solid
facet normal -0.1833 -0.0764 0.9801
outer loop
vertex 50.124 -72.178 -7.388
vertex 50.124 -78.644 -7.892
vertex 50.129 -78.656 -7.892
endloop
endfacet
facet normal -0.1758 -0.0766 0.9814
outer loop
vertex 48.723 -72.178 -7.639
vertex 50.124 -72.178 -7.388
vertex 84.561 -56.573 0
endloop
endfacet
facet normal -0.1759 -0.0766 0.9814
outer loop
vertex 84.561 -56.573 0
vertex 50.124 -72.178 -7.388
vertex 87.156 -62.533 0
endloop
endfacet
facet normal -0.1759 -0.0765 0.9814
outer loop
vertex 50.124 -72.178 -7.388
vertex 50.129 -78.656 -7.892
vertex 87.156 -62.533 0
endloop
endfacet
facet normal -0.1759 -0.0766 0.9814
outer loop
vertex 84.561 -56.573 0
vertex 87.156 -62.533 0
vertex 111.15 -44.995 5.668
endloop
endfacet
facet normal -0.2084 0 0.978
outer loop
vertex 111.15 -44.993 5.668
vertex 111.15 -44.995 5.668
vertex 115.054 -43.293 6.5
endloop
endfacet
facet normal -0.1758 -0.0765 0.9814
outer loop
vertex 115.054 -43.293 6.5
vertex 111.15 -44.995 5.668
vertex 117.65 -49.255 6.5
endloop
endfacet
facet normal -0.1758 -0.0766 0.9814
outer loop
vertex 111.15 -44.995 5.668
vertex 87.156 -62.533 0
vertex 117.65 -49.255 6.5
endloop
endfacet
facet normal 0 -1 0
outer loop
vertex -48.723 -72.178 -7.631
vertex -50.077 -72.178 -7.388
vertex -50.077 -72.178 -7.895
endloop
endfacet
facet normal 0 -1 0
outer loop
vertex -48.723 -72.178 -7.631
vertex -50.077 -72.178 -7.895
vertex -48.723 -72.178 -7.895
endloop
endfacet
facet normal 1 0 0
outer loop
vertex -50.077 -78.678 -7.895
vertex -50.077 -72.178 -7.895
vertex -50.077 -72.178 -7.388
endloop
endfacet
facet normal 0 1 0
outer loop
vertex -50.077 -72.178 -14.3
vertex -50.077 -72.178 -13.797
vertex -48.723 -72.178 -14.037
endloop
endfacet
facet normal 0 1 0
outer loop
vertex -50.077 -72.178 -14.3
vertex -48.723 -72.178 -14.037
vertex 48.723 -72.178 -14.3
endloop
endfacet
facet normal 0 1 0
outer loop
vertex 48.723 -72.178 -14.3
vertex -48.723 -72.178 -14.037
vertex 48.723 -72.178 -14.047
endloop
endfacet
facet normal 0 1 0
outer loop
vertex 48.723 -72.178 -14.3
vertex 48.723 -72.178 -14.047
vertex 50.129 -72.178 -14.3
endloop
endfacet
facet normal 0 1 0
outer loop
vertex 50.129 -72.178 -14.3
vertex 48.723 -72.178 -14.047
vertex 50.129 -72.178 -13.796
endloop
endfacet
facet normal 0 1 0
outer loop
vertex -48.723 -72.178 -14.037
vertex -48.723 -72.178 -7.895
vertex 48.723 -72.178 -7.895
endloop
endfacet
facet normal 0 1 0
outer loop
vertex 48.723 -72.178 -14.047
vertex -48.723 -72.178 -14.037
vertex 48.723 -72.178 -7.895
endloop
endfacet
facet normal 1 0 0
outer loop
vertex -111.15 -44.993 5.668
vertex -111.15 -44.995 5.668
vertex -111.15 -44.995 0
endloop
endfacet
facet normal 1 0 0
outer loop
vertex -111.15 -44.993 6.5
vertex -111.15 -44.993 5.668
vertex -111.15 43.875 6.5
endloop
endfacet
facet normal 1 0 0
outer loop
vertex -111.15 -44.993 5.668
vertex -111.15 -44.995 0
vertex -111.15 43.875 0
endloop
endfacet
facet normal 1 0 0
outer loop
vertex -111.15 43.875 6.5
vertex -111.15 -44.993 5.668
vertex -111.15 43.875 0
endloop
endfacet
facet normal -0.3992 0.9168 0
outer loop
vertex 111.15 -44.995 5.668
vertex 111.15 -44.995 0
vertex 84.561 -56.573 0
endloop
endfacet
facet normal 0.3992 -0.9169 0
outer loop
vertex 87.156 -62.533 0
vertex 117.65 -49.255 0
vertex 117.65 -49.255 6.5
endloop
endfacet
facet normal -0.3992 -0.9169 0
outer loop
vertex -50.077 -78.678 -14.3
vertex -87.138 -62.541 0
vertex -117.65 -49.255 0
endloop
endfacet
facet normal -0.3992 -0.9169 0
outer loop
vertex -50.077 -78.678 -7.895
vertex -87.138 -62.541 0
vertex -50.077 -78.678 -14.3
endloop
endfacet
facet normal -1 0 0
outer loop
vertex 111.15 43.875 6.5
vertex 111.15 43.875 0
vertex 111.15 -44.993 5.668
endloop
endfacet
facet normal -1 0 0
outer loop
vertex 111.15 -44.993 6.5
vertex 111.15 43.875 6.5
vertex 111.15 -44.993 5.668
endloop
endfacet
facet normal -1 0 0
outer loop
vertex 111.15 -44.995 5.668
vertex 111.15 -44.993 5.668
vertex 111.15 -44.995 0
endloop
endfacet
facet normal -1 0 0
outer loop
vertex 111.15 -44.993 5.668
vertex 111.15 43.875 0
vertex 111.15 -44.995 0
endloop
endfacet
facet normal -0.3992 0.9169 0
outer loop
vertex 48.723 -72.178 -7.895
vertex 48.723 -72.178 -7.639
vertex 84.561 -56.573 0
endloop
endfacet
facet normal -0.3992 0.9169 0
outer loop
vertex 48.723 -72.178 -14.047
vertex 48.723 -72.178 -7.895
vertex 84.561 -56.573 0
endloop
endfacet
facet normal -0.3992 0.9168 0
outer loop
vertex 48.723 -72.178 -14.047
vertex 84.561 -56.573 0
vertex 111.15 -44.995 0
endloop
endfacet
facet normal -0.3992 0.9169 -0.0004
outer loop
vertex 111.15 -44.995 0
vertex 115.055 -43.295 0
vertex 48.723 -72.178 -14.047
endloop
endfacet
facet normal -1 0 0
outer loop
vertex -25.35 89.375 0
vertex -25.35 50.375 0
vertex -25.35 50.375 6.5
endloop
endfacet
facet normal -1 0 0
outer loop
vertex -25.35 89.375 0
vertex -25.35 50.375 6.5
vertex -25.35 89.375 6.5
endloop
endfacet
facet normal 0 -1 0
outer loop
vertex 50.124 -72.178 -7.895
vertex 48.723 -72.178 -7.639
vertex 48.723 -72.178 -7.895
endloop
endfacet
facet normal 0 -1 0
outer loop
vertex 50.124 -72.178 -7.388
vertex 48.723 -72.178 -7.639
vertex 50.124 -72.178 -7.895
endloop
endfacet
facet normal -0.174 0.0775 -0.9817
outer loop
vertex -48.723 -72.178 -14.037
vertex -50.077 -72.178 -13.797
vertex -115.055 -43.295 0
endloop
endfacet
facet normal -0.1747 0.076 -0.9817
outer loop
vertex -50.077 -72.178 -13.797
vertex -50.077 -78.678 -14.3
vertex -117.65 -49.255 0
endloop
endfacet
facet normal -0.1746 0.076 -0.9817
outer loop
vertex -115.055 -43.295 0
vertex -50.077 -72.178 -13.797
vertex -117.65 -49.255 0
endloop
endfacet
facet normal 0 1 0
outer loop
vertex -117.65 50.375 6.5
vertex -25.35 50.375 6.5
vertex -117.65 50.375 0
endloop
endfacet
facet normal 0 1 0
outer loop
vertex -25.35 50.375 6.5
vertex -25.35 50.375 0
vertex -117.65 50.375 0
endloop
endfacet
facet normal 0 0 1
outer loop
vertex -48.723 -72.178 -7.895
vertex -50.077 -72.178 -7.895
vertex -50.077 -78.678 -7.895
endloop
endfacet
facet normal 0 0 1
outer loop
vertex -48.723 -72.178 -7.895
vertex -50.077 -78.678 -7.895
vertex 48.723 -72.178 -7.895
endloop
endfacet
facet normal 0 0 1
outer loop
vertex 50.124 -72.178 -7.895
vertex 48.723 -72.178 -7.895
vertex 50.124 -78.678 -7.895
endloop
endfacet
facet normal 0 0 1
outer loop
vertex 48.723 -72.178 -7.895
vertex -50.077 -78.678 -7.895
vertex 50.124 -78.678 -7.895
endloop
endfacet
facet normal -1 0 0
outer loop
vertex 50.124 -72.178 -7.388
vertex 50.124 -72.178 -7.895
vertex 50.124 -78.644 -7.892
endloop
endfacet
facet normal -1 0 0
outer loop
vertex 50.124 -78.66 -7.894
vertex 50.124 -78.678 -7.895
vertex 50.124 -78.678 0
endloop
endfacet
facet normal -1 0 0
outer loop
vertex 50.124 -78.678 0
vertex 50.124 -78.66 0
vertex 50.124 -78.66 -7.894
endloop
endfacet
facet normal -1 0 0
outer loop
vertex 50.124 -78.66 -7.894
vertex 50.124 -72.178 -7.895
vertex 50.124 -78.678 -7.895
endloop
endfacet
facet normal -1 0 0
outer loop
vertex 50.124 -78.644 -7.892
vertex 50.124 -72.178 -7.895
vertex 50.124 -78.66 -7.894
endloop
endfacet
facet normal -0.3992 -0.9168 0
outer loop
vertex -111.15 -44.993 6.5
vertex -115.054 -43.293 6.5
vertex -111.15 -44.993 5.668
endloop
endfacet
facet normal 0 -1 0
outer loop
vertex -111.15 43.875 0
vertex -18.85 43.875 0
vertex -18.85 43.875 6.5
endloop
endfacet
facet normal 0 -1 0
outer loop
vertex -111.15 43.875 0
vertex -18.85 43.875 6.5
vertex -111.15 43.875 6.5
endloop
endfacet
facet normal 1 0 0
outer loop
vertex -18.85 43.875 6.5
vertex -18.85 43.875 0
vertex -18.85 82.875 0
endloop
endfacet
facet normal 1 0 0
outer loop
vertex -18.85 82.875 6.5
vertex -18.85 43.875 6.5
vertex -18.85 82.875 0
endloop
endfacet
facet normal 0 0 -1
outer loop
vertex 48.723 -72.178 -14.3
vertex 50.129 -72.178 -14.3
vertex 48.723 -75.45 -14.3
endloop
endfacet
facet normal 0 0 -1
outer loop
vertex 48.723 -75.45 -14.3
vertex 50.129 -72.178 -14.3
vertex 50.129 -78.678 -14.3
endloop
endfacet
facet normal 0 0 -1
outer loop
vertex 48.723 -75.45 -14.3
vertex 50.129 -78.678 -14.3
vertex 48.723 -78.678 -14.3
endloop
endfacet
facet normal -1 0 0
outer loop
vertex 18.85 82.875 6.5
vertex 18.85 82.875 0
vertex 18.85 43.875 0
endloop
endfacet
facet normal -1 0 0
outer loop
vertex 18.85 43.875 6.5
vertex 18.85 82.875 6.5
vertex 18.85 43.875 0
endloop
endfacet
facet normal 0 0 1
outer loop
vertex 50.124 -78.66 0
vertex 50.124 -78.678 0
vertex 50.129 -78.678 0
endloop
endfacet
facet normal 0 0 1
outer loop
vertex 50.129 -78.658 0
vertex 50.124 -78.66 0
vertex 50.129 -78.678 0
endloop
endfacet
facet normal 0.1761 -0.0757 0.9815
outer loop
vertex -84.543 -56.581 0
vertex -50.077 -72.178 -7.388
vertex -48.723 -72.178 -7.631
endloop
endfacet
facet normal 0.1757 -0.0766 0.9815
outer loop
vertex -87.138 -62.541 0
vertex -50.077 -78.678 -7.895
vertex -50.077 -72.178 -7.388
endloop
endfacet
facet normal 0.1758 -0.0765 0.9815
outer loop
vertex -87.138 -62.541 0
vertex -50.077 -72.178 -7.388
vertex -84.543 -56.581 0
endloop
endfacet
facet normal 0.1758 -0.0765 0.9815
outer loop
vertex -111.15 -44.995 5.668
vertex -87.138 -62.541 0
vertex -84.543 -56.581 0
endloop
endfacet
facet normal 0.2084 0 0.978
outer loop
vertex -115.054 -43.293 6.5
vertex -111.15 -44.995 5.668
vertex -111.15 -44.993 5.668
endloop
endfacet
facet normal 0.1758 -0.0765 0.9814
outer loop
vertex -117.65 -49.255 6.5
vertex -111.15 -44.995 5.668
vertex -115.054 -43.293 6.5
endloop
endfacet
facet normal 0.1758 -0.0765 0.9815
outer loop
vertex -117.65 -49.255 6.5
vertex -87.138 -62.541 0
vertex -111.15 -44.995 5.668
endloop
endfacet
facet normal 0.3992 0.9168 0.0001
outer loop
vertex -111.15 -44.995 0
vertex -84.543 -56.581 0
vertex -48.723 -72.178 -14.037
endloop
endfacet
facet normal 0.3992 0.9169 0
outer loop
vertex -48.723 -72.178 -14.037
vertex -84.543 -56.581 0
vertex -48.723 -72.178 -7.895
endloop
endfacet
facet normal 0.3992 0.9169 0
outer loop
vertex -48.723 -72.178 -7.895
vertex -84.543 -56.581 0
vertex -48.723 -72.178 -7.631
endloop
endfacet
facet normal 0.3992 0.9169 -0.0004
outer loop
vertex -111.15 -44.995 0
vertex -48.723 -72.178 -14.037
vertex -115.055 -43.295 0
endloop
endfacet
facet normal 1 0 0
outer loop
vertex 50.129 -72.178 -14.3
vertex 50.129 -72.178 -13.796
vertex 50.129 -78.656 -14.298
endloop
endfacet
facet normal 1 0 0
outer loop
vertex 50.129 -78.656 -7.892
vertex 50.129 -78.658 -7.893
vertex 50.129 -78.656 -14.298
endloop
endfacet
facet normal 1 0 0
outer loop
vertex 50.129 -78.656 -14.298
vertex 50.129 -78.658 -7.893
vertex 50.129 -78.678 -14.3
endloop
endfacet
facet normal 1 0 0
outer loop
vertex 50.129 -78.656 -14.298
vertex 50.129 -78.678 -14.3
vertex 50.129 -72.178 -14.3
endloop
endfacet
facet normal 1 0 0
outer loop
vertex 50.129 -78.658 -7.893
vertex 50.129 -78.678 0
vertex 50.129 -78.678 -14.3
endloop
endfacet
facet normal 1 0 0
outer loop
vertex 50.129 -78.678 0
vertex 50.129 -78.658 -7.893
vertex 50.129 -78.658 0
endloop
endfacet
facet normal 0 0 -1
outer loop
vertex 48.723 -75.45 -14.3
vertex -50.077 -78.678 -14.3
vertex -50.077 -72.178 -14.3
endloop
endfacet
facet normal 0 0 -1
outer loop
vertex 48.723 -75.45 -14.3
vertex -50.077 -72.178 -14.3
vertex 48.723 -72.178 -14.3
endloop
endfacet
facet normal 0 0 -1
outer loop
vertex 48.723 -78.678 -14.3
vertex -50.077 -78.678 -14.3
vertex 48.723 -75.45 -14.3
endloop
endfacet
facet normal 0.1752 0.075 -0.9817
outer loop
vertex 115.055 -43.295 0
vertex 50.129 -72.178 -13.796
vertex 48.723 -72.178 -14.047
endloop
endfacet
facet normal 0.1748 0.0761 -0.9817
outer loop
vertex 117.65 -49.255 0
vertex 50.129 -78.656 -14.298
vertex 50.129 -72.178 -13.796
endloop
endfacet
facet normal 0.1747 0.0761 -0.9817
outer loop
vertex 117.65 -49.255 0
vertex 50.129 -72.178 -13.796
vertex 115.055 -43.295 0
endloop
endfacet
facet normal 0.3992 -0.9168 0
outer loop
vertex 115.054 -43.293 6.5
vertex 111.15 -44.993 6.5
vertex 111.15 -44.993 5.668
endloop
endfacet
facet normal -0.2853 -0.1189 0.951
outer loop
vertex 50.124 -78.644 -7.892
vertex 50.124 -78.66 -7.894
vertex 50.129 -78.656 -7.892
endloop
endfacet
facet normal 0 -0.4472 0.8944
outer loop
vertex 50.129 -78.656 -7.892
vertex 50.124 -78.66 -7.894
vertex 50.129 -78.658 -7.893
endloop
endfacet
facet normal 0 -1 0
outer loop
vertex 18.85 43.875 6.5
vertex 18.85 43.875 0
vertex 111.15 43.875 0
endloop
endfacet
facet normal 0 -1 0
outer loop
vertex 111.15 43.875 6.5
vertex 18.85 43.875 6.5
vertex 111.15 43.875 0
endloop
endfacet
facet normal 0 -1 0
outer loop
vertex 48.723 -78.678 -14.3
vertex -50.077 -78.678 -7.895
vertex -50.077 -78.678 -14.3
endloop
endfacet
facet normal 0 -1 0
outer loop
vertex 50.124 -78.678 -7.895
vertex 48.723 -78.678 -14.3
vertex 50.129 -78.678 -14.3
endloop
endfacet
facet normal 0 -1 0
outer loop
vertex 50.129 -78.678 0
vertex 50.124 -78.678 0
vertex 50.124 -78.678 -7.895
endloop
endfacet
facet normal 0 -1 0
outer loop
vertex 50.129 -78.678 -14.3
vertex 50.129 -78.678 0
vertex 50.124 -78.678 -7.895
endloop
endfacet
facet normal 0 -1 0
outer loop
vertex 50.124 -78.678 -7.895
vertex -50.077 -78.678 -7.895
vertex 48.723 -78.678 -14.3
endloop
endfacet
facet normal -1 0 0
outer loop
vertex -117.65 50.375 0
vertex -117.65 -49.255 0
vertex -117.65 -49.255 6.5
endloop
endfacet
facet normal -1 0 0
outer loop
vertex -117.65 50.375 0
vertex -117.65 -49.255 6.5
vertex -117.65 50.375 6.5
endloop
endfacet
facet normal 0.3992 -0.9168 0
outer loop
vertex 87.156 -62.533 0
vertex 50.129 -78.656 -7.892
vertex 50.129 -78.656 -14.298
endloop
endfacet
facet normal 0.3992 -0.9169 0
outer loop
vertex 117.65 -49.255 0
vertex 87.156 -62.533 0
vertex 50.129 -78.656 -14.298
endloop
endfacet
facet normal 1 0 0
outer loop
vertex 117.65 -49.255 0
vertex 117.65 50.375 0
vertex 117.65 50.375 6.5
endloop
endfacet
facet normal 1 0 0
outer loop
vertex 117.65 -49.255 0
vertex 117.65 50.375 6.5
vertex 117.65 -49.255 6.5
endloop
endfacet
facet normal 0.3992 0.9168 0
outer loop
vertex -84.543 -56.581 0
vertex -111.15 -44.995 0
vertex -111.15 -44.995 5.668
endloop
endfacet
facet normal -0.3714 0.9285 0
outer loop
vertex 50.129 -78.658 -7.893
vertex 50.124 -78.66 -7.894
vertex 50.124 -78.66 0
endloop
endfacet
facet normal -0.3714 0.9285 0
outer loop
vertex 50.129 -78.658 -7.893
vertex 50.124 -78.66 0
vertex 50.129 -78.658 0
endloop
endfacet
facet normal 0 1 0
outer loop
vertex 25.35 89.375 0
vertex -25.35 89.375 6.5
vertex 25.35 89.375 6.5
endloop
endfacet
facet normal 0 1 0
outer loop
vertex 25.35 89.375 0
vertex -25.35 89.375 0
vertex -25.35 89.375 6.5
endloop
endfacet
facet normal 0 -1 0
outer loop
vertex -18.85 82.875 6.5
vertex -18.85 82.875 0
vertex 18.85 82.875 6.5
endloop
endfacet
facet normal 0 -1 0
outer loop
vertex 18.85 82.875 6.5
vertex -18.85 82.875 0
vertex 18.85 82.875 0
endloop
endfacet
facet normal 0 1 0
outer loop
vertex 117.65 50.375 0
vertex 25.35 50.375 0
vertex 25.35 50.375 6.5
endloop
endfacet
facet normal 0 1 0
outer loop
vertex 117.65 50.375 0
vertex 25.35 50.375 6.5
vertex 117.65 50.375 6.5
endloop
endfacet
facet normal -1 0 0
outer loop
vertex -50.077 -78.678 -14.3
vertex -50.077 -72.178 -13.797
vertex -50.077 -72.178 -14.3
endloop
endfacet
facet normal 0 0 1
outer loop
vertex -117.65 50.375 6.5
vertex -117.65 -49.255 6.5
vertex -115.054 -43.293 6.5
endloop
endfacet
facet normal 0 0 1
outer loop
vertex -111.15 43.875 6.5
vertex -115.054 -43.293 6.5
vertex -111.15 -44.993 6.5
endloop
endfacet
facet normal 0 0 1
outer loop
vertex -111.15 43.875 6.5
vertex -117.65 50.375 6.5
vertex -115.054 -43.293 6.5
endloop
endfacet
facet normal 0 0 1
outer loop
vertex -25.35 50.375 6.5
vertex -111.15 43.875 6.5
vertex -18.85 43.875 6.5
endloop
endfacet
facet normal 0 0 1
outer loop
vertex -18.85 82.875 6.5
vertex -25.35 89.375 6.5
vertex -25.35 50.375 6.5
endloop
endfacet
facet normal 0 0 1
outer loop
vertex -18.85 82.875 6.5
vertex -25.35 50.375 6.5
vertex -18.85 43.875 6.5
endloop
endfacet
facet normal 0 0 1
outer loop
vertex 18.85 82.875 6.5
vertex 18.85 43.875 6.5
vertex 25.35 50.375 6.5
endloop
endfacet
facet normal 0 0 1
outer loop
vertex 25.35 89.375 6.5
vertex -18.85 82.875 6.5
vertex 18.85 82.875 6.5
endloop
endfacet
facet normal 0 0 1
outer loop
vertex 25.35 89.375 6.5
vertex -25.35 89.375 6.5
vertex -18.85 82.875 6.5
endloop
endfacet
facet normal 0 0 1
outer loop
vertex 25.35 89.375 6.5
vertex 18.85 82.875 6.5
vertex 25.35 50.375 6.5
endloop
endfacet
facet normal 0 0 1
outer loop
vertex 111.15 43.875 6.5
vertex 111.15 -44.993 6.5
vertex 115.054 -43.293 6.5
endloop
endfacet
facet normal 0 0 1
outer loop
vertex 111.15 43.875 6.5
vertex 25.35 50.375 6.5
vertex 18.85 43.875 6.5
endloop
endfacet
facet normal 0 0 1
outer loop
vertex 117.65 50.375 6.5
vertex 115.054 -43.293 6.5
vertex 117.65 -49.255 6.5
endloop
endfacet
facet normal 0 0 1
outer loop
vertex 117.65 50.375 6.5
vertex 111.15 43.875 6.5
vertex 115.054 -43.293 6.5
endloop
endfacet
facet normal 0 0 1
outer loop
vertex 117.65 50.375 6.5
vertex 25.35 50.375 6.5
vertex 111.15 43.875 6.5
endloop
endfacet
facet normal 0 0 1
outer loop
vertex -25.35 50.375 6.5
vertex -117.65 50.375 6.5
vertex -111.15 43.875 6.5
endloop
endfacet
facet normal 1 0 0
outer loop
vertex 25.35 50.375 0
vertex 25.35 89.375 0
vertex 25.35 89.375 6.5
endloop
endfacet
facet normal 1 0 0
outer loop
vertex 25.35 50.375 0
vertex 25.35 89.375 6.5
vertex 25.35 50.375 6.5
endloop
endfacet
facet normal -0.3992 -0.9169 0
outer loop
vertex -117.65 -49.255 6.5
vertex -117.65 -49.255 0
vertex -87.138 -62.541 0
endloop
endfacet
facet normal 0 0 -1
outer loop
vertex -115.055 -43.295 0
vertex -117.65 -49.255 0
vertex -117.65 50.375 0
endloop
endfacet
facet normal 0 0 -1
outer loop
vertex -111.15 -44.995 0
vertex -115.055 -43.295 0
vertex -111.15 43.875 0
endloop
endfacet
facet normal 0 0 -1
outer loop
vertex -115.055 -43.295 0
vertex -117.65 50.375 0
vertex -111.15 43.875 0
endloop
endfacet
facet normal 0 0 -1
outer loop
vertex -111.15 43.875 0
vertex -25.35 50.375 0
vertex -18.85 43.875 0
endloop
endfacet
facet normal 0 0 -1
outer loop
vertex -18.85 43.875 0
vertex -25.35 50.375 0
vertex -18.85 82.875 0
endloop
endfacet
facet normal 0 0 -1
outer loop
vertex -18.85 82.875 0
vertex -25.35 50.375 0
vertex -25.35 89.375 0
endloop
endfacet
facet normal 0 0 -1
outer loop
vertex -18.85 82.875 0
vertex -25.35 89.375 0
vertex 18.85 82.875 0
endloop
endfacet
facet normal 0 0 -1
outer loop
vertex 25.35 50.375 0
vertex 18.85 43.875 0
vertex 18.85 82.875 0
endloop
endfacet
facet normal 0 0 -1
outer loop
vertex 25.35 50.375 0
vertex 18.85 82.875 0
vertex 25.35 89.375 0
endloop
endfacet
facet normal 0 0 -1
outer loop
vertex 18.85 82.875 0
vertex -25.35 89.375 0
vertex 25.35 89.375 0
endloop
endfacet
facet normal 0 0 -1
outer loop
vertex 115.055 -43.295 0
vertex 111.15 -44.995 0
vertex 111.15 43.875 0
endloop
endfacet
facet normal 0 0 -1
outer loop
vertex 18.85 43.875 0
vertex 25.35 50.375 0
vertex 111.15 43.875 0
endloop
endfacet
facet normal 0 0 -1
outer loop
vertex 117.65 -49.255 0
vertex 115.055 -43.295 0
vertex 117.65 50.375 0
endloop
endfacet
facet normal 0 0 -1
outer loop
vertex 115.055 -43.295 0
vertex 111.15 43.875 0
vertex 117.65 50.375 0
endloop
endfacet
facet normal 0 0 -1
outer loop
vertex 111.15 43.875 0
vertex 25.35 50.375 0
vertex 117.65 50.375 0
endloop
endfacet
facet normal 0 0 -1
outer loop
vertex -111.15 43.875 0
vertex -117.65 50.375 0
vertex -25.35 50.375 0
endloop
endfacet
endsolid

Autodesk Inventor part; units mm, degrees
ref_plane "YZ Plane" through (0, 0, 0) normal (1, 0, 0) x (0, 1, 0)
ref_plane "XZ Plane" through (0, 0, 0) normal (0, 1, 0) x (-1, 0, 0)
ref_plane "XY Plane" through (0, 0, 0) normal (0, 0, 1) x (1, 0, 0)
sketch "Sketch1" plane through (0, 0, 0) normal (0, 0, 1) x (1, 0, 0)
  line L0 (-107.9, 41.925) -> (107.9, -41.925) construction
  line L1 (107.9, 41.925) -> (-107.9, -41.925) construction
  line L2 (-114.4, -47.125) -> (-114.4, 47.125)
  line L3 (114.4, 47.125) -> (114.4, -47.125)
  line L4 (114.4, -47.125) -> (-114.4, 47.125) construction
  line L5 (-114.4, -47.125) -> (114.4, 47.125) construction
  line L6 (-22.1, 47.125) -> (-22.1, 86.125)
  line L7 (-22.1, 86.125) -> (22.1, 86.125)
  line L8 (22.1, 86.125) -> (22.1, 47.125)
  line L9 (22.1, 47.125) -> (114.4, 47.125)
  line L10 (-22.1, 47.125) -> (-114.4, 47.125)
  line L11 (114.4, -47.125) -> (49.4, -75.4283)
  line L12 (-114.4, -47.125) -> (-49.4, -75.4283)
  line L13 (49.4, -75.4283) -> (-49.4, -75.4283)
  point P0 (0, 0)
  point P1 (0, 0)
  point P2 (0, 80.925)
  point P3 (0, 0)
  point P4 (0, 86.125)
  point P5 (0, 0)
  dimension "Comp" = 215.8
  dimension "Lar" = 83.85
  dimension "d10" = 215.8
  dimension "LarMaior" = 94.25
  dimension "CompMaior" = 228.8
  dimension "d20" = 39
  dimension "d21" = 44.2
  dimension "d25" = 65
  dimension "d27" = 65
  dimension "d28" = 98.8
extrude "Extrusion1" add sketch "Sketch1" along normal blind 6.5
shell "Shell1" thickness 6.5 both sides yes removed faces 2 at (-7.3667, -34.5772, 6.5) at (-7.3667, -34.5772, 0)
sketch "Sketch2" plane through (-50.0769, -78.6783, 0) normal (-0.3992292, -0.9168512, 0) x (0.9168512, -0.3992292, 0)
  line L0 (0, 0) -> (0, -14.3)
  line L1 (-113.4763, 0) -> (-73.7013, 0) projected
  line L2 (0, -14.3) -> (-73.7013, 0)
  line L3 (-73.7013, 0) -> (0, 0)
  point P0 (14.5024, 0)
  dimension "d32" = 14.3
extrude "Extrusion2" add sketch "Sketch2" against normal blind 6.5
sketch "Sketch3" plane through (-50.0769, -78.6783, 6.5) normal (0, -1, 0) x (1, 0, 0)
  line L0 (0, -20.8002) -> (98.8, -20.8002)
  line L1 (100.2059, -6.5) -> (100.2059, -20.8002)
  line L2 (100.2059, -20.8002) -> (98.8, -20.8002)
  line L3 (0, -6.5) -> (0, 0) projected
  line L4 (0, -6.5) -> (0, -20.8002)
  line L5 (0, -6.5) -> (100.1538, -6.5) projected
  line L6 (0, -6.5) -> (100.2059, -6.5)
  line L7 (0, 0) -> (100.1538, 0) projected
  point P0 (50.0769, -6.5)
  dimension "d35" = 98.8
extrude "Extrusion3" add sketch "Sketch3" against normal blind 6.5
sketch "Sketch4" plane through (117.65, -49.2546, 0) normal (0.3992292, -0.9168512, 0) x (0.9168512, 0.3992292, 0)
  line L0 (-165.5274, -14.3002) -> (-73.6535, -14.3002) projected
  line L1 (0, 0) -> (0, 6.5) projected
  line L2 (-73.6535, -14.3002) -> (0, 0)
  line L3 (0, 0) -> (-73.6535, 0)
  line L4 (-73.6535, 0) -> (-73.6535, -14.3002)
  point P0 (-88.2037, 0)
extrude "Extrusion4" add sketch "Sketch4" against normal blind 6.5
sketch "Sketch5" plane through (-50.0769, -78.6783, 6.5) normal (0, -1, 0) x (1, 0, 0)
  line L0 (0, -20.8) -> (0, 0) projected
  line L1 (100.2009, 0) -> (0, 0)
  line L2 (0, 0) -> (0, -14.3951)
  line L3 (0, -14.3951) -> (100.2009, -14.3951)
  line L4 (100.2009, -14.3951) -> (100.2009, 0)
  point P0 (50.0769, -6.5)
extrude "Extrusion5" cut sketch "Sketch5" against normal blind 6.5
sketch "Sketch6" plane through (-117.65, -49.2546, 0) normal (-0.3992292, -0.9168512, 0) x (0.9168512, -0.3992292, 0)
  line L0 (73.7013, -14.3) -> (73.7013, -7.8951) projected
  line L1 (0, 0) -> (0, 6.5) projected
  line L2 (73.7013, -7.8951) -> (0, 6.5)
  line L3 (0, 6.5) -> (73.7013, 6.5)
  line L4 (73.7013, 6.5) -> (73.7013, -7.8951)
  point P0 (88.2037, 0)
extrude "Extrusion6" cut sketch "Sketch6" against normal blind 6.5
sketch "Sketch8" plane through (50.129, -78.6556, -14.2985) normal (0.3992292, -0.9168512, 0) x (0.9168512, 0.3992292, 0)
  line L0 (-0.0136, 6.4034) -> (-91.8829, 6.4034) projected
  line L1 (-0.0054, 20.7985) -> (73.6445, 20.7985) projected
  line L2 (-0.0136, 6.4034) -> (73.6445, 20.7985)
  line L3 (73.6445, 20.7985) -> (-0.0136, 20.7985)
  line L4 (69.3853, 20.7985) -> (1.2969, 20.7985) projected
  line L5 (-0.0136, 20.7985) -> (-0.0136, 6.4034)
  line L6 (0, 0) -> (0, 14.2985) projected
  point P0 (-14.5592, 14.2985)
extrude "Extrusion7" cut sketch "Sketch8" against normal blind 6.5
properties part number "Buste2-2"
